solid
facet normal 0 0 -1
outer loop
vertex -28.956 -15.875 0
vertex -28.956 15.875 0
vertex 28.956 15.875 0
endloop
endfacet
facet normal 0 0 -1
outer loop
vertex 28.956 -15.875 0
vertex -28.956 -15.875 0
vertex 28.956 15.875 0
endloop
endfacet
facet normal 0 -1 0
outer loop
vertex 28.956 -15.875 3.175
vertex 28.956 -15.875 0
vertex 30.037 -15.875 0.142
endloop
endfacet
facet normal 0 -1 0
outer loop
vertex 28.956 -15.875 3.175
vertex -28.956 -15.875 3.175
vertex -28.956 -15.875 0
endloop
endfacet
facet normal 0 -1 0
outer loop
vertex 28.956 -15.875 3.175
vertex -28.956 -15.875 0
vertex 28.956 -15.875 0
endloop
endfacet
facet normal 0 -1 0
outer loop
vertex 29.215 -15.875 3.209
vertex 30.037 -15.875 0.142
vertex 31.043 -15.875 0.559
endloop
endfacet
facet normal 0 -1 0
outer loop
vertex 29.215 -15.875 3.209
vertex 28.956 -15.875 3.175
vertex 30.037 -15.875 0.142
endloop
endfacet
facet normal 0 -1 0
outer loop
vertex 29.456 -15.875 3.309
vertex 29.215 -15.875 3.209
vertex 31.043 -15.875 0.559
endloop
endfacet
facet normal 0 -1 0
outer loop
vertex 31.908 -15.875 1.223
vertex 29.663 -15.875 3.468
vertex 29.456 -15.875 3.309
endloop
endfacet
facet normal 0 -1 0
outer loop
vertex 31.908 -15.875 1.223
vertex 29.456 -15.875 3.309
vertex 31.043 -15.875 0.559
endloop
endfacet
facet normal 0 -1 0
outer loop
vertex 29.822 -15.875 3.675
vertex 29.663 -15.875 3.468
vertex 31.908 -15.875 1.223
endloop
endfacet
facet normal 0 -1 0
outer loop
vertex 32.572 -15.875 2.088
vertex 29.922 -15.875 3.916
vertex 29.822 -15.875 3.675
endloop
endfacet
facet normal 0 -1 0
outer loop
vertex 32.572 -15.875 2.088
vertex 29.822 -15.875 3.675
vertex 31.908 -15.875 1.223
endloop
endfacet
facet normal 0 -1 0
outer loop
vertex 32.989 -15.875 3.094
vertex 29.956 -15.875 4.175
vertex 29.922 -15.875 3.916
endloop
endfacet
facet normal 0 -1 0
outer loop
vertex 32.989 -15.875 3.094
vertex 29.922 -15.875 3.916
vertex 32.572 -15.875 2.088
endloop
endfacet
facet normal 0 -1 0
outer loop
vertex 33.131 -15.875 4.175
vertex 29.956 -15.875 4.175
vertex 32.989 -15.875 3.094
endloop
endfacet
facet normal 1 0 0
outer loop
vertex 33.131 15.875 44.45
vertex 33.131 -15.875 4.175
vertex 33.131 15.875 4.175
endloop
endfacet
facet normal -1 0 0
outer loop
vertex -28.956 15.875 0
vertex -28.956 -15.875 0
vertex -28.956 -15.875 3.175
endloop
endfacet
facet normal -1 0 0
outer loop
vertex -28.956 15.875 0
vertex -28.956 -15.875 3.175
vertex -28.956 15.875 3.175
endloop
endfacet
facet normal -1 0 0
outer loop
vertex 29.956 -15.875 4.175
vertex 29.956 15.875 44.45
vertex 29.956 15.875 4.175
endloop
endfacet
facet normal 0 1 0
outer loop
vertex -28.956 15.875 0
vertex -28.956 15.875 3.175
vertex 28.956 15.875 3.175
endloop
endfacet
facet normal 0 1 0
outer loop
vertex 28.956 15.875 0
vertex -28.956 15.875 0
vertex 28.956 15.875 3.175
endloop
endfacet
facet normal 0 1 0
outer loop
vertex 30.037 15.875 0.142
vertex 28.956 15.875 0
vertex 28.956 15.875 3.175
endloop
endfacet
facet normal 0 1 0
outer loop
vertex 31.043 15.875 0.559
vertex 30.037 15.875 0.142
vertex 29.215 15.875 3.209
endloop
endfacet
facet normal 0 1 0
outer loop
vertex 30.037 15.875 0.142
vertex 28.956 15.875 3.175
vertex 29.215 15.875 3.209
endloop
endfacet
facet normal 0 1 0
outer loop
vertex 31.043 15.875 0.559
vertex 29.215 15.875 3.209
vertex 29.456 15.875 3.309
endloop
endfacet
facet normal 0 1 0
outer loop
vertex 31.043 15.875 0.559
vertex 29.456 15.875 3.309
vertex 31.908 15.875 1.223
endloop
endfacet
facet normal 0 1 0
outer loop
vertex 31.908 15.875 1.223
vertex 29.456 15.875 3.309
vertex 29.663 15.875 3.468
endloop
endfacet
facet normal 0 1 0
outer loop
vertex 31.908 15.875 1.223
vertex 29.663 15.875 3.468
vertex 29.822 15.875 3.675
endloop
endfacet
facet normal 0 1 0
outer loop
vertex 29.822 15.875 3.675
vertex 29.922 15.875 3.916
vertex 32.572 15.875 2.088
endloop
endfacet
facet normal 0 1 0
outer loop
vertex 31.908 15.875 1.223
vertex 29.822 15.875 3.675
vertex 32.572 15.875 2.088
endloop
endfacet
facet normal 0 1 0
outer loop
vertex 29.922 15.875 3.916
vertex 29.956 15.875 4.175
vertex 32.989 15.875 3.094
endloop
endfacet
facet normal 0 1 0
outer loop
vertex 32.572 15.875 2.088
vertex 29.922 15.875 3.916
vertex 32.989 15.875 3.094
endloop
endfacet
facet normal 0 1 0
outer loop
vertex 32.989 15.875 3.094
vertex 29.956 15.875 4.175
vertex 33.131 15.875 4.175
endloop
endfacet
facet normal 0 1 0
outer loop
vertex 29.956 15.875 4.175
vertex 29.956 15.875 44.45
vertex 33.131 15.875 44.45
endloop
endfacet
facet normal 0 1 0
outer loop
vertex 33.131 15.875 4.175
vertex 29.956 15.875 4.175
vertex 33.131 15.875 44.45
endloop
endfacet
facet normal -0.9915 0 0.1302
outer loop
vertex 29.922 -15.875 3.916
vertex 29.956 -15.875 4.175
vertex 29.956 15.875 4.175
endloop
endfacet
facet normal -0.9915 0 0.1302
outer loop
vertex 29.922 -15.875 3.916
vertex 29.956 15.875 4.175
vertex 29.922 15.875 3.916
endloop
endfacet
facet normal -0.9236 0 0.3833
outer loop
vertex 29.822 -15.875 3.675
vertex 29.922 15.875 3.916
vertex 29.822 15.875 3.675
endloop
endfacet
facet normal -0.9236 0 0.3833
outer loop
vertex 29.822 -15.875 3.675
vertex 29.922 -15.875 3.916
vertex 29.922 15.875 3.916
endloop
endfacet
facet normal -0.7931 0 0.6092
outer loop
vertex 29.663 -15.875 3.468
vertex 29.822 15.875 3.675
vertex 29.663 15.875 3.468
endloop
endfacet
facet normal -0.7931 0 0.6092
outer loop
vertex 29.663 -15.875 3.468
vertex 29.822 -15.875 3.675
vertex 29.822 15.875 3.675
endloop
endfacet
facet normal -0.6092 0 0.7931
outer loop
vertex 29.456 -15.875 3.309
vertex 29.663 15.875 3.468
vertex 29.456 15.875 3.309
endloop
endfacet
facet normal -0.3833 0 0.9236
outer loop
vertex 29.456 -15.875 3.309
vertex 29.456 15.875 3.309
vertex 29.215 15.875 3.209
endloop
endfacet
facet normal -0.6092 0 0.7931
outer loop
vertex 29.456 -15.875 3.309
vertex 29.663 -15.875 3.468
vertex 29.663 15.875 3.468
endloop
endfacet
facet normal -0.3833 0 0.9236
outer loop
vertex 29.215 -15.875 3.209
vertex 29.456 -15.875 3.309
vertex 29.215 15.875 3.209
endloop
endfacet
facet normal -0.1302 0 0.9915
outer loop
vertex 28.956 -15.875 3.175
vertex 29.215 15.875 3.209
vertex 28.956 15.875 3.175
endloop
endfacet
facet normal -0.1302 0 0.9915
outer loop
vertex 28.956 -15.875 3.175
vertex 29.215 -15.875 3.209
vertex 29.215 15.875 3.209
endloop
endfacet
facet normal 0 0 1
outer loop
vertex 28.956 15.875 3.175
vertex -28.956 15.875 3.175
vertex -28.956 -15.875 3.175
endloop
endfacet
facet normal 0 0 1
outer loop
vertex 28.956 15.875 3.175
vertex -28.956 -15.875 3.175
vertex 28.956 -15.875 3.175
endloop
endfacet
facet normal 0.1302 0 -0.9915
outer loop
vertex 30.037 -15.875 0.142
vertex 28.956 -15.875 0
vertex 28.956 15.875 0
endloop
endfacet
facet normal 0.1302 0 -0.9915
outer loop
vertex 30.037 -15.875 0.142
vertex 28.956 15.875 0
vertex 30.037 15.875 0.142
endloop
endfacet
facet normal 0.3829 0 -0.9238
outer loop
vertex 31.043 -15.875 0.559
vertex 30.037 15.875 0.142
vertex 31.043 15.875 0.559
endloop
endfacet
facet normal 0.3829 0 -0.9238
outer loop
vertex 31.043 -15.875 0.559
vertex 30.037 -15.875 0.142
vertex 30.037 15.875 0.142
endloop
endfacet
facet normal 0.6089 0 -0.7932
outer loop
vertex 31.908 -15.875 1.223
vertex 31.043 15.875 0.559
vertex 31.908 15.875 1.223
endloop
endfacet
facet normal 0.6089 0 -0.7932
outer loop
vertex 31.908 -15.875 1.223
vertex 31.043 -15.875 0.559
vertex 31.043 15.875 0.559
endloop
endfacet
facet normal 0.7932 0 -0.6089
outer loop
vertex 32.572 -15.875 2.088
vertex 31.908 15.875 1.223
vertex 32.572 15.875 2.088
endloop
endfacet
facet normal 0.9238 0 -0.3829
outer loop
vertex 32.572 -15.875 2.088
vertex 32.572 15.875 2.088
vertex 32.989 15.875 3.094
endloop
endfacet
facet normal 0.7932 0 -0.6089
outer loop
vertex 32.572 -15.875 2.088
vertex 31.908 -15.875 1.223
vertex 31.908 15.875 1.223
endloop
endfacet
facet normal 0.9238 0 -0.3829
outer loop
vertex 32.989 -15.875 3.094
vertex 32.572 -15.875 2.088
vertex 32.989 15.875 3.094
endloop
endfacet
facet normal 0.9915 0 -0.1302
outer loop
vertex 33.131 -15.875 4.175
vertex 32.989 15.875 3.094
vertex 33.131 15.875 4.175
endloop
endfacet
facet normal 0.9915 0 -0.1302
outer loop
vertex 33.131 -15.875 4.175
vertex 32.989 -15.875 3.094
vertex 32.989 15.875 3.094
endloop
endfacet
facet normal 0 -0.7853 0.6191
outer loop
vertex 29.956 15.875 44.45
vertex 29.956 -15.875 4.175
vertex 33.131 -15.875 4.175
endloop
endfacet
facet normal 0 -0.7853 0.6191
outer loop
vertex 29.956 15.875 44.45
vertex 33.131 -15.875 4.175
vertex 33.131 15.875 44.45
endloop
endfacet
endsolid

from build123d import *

# Parameters (mm, degrees)
SKETCH2_W               = 57.912
SKETCH2_H               = 31.75
BASE_FLANGE1_DEPTH      = 3.175
EDGE_FLANGE1_DEPTH      = 31.75
CUT_EXTRUDE2_DEPTH      = 78.991112917
CUT_EXTRUDE2_DEPTH_BACK = 3.175


# Sheet-metal steps are written as plain solids
with BuildPart() as part:
    # Sketch2 → Base-Flange1 (new body)
    with BuildSketch(Plane.XY):
        Rectangle(SKETCH2_W, SKETCH2_H)
    extrude(amount=BASE_FLANGE1_DEPTH)

    # Edge-Flange1 section (across the edge) → Edge-Flange1 (add)
    with BuildSketch(Plane(origin=(29.956, -15.875, 3.175), x_dir=(-1, 0, 0), z_dir=(0, 1, 0))):
        with BuildLine():
            Line((-3.175, 1), (-3.175, 41.275))
            Line((-3.175, 41.275), (0, 41.275))
            Line((0, 41.275), (0, 1))
            ThreePointArc((0, 1), (0.292893219, 0.292893219), (1, 0))
            Line((1, 0), (1, -3.175))
            ThreePointArc((1, -3.175), (-1.952170811, -1.952170811), (-3.175, 1))
        make_face()
    extrude(amount=EDGE_FLANGE1_DEPTH)

    # Sketch11 → Cut-Extrude2 (cut, two sides: drawn at the far end of the back side and taken through both)
    with BuildSketch(Plane(origin=(33.131, 0, 0), x_dir=(0, 0, -1), z_dir=(1, 0, 0)).offset(-CUT_EXTRUDE2_DEPTH_BACK)):
        Polygon((89.473958122, -89.701304665), (-4.175, -15.875), (-44.45, 15.875), (-138.098958122, 89.701304665), (-285.751567452, -97.596611579), (-58.178651208, -276.999220909), align=None)
    extrude(amount=CUT_EXTRUDE2_DEPTH + CUT_EXTRUDE2_DEPTH_BACK, mode=Mode.SUBTRACT)


solid = part.part
